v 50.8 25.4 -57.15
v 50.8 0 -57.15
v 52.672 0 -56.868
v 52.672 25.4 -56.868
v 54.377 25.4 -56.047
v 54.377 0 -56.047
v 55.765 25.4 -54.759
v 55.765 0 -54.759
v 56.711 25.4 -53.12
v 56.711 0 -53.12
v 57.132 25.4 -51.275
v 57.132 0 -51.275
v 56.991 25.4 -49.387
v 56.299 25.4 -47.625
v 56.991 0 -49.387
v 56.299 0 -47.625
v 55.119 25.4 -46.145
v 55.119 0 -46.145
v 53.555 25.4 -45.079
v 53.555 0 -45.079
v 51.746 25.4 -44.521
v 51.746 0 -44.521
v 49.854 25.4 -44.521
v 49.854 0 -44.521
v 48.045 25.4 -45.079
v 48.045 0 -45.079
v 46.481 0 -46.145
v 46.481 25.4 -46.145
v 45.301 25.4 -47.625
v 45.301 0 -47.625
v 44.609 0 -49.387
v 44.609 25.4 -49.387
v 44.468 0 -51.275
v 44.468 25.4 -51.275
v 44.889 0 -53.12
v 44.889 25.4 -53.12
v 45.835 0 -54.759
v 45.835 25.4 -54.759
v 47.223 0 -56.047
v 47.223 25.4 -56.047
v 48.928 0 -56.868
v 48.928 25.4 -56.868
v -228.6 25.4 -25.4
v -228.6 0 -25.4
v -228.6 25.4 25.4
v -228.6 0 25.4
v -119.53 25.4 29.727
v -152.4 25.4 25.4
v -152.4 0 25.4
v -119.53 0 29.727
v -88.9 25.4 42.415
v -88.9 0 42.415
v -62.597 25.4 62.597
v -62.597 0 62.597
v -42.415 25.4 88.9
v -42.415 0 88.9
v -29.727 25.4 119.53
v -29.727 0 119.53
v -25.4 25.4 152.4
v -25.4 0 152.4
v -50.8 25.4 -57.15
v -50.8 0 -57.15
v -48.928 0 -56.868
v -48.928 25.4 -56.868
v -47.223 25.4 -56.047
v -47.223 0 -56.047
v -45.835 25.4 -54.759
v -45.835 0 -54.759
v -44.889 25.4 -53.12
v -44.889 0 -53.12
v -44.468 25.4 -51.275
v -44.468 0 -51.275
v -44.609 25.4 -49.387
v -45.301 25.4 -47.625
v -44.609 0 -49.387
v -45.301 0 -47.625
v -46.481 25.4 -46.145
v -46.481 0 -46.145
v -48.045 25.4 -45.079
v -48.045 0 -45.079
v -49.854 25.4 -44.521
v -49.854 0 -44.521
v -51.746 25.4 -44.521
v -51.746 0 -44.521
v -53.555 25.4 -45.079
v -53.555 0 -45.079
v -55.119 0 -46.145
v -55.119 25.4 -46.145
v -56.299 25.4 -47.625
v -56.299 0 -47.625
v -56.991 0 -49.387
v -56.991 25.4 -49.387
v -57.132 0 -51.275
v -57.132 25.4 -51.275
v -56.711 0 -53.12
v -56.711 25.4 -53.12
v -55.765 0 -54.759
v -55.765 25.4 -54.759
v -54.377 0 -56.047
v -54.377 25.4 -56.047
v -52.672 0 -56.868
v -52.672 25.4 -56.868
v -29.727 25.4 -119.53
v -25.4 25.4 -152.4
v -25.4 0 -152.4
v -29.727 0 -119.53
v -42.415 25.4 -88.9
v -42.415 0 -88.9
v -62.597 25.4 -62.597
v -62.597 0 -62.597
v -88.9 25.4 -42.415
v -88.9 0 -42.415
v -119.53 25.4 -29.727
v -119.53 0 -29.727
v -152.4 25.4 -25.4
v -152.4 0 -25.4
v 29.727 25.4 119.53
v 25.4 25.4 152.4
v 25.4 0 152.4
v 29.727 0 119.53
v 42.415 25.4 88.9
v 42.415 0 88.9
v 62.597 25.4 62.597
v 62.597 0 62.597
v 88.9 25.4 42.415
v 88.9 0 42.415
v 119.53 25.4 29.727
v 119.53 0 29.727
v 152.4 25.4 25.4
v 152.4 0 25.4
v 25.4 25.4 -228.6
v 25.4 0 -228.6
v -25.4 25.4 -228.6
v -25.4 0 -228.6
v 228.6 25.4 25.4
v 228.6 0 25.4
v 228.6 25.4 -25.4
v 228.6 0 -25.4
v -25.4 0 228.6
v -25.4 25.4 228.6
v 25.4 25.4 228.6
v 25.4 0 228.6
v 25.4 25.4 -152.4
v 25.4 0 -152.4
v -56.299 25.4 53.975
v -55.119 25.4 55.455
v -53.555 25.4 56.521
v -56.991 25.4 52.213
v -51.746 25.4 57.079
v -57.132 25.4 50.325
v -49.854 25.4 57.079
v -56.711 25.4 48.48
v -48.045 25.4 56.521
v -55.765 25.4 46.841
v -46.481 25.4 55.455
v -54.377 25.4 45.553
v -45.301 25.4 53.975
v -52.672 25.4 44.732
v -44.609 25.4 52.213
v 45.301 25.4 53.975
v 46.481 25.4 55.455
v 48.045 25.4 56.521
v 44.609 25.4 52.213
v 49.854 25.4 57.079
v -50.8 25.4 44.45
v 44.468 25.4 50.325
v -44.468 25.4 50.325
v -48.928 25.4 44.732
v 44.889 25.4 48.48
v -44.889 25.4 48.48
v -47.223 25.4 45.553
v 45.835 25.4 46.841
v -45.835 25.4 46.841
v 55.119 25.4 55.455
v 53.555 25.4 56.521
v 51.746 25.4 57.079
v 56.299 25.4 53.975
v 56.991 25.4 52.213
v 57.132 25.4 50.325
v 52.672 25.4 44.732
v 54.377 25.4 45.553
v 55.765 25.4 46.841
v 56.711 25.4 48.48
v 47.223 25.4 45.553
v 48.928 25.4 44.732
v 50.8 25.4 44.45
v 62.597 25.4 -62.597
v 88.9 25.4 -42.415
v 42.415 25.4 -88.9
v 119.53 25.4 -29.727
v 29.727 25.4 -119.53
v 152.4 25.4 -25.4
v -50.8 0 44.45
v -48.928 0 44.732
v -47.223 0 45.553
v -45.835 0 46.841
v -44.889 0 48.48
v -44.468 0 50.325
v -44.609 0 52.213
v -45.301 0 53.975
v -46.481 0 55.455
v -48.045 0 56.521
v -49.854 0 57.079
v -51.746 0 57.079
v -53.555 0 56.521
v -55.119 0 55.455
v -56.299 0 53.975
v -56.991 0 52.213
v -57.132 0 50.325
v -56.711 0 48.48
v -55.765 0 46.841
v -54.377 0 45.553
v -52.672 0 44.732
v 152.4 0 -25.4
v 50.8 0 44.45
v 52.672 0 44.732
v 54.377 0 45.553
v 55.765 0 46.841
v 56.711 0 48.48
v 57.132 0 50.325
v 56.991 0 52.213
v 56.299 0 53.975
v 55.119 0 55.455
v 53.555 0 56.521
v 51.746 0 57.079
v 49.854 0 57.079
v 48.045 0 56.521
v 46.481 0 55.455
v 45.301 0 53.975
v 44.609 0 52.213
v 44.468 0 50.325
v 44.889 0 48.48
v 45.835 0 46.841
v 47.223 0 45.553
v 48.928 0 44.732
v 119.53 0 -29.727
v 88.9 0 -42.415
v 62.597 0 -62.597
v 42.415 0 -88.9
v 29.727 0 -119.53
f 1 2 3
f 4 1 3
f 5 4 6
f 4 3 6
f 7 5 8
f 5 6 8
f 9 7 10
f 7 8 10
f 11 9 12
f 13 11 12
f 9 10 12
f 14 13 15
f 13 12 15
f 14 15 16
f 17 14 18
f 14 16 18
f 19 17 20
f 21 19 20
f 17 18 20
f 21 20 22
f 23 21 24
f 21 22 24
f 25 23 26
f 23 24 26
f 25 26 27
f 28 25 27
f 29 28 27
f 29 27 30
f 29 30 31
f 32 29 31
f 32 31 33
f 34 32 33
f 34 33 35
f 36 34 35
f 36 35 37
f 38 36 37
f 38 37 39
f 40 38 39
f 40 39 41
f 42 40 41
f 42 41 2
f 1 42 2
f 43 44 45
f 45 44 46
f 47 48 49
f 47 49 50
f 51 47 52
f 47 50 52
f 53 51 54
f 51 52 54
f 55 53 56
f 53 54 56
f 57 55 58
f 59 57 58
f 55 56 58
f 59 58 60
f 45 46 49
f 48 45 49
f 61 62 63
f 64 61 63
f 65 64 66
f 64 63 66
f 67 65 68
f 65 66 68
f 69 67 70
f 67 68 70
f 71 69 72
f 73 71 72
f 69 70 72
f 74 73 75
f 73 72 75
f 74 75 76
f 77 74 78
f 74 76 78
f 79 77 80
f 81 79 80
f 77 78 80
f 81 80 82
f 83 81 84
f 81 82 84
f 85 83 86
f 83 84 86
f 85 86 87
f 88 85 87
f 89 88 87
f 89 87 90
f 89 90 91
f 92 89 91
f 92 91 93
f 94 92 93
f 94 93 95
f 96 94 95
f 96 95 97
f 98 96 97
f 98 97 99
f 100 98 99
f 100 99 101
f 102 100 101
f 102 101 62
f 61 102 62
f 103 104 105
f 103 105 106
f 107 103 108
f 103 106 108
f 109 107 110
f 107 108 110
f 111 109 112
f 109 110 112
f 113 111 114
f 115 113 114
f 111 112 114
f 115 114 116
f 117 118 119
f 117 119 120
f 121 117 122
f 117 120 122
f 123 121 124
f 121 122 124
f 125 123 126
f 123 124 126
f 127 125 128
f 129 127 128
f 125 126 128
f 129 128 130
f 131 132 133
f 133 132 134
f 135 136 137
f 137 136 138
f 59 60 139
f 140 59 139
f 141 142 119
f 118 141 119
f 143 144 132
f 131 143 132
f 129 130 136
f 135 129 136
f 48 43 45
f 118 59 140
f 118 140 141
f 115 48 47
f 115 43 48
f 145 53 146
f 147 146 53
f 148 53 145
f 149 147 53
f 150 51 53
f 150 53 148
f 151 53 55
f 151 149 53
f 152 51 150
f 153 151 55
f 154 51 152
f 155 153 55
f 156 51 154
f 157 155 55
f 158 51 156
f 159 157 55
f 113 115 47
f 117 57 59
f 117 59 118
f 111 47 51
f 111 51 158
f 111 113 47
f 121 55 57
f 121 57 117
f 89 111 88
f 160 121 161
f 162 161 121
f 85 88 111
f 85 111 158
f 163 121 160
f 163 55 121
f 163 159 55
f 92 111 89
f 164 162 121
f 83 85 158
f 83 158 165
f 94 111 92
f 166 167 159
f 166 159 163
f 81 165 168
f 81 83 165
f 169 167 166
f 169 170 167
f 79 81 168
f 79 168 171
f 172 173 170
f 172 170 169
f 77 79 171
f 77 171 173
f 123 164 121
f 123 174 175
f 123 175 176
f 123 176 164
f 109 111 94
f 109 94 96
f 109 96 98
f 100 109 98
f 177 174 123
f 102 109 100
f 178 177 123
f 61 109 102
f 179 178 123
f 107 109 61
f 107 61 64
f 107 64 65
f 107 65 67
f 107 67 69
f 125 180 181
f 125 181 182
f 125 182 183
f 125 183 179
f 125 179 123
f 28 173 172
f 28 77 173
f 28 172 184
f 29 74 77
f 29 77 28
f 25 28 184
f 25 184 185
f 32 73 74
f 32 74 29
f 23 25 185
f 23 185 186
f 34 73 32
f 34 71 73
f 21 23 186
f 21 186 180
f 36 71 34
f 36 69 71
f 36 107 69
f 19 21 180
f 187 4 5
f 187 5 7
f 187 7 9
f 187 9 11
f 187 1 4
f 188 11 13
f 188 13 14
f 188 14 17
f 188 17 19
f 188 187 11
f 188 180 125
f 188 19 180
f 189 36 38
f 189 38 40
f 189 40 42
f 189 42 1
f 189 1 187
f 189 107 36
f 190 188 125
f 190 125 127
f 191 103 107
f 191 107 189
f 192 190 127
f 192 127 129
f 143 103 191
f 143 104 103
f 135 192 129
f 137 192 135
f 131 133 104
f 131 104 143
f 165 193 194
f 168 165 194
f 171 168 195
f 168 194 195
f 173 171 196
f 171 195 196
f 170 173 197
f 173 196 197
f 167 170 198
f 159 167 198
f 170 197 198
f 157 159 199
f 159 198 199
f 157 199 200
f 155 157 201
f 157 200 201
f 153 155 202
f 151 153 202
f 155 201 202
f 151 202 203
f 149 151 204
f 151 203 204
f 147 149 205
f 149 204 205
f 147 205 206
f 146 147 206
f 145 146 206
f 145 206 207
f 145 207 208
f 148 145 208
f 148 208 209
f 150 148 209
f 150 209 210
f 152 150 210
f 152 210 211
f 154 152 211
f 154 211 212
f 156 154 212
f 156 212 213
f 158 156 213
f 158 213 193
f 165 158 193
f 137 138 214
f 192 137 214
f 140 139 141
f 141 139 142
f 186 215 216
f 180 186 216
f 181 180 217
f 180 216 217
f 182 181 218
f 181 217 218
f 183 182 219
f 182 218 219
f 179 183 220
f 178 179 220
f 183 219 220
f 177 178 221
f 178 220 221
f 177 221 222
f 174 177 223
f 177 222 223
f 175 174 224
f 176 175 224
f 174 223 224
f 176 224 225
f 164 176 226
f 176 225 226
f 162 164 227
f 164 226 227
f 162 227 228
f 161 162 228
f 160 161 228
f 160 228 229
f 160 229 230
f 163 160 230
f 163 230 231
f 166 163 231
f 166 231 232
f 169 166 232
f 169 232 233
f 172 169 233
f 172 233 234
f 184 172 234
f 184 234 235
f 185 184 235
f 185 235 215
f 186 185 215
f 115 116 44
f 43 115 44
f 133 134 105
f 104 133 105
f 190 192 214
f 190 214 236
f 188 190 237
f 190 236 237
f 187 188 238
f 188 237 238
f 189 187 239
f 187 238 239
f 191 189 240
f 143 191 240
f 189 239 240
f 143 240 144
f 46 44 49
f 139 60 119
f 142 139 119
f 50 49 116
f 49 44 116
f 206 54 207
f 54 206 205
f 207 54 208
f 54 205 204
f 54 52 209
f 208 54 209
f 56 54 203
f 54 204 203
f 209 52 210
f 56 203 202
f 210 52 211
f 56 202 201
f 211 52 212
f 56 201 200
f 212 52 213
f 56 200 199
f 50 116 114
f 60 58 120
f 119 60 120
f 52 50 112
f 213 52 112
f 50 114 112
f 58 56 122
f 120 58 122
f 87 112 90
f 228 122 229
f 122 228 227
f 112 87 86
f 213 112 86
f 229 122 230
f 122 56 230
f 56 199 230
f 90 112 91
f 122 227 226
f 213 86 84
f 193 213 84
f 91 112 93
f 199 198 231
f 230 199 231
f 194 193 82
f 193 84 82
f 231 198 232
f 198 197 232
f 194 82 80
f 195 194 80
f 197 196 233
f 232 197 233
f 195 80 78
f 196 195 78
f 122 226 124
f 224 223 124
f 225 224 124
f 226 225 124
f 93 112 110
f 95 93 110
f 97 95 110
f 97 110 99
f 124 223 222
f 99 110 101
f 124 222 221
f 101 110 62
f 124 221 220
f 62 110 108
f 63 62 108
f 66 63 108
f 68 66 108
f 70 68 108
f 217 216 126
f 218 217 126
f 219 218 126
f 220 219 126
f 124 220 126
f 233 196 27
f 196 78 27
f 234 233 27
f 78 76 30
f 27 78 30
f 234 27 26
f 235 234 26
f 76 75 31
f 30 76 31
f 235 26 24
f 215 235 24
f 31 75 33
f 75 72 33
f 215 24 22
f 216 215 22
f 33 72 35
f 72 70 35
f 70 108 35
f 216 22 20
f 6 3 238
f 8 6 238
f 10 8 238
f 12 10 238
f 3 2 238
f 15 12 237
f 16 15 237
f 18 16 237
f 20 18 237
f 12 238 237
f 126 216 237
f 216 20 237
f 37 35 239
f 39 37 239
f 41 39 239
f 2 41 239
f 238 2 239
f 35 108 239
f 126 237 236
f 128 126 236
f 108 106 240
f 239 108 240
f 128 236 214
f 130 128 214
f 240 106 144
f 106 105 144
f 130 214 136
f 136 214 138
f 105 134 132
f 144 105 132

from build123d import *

# Parameters (mm, degrees)
BOSS_EXTRUDE1_DEPTH = 25.4
CUT_EXTRUDE1_REACH  = 326.285
SKETCH2_R           = 6.35


with BuildPart() as part:
    # Sketch1 → Boss-Extrude1 (new body)
    with BuildSketch(Plane(origin=(0, 0, 0), x_dir=(1, 0, 0), z_dir=(0, 1, 0))):
        with BuildLine():
            Line((-152.4, 25.4), (-228.6, 25.4))
            Line((-228.6, 25.4), (-228.6, -25.4))
            Line((-228.6, -25.4), (-152.4, -25.4))
            ThreePointArc((-152.4, -25.4), (-62.597438789, -62.597438789), (-25.4, -152.4))
            Line((-25.4, -152.4), (-25.4, -228.6))
            Line((-25.4, -228.6), (25.4, -228.6))
            Line((25.4, -228.6), (25.4, -152.4))
            ThreePointArc((25.4, -152.4), (62.597438789, -62.597438789), (152.4, -25.4))
            Line((152.4, -25.4), (228.6, -25.4))
            Line((228.6, -25.4), (228.6, 25.4))
            Line((228.6, 25.4), (152.4, 25.4))
            ThreePointArc((152.4, 25.4), (62.597438789, 62.597438789), (25.4, 152.4))
            Line((25.4, 152.4), (25.4, 228.6))
            Line((25.4, 228.6), (-25.4, 228.6))
            Line((-25.4, 228.6), (-25.4, 152.4))
            ThreePointArc((-25.4, 152.4), (-62.597438789, 62.597438789), (-152.4, 25.4))
        make_face()
    extrude(amount=BOSS_EXTRUDE1_DEPTH)

    # Sketch2 → Cut-Extrude1 (cut, up to next)
    with BuildSketch(Plane(origin=(0, 0, 0), x_dir=(-1, 0, 0), z_dir=(0, -1, 0)), mode=Mode.PRIVATE) as cut_extrude1_sk1:
        with Locations(Location((50.8, -50.8, 0), (0, 0, 90))):
            Circle(SKETCH2_R)
    cut_extrude1_tool1 = extrude(cut_extrude1_sk1.sketch, amount=-CUT_EXTRUDE1_REACH, mode=Mode.PRIVATE) & part.part
    # Sketch2 → Cut-Extrude1 (cut, up to next)
    with BuildSketch(Plane(origin=(0, 0, 0), x_dir=(-1, 0, 0), z_dir=(0, -1, 0)), mode=Mode.PRIVATE) as cut_extrude1_sk2:
        with Locations(Location((50.8, 50.8, 0), (0, 0, 90))):
            Circle(SKETCH2_R)
    cut_extrude1_tool2 = extrude(cut_extrude1_sk2.sketch, amount=-CUT_EXTRUDE1_REACH, mode=Mode.PRIVATE) & part.part
    # Sketch2 → Cut-Extrude1 (cut, up to next)
    with BuildSketch(Plane(origin=(0, 0, 0), x_dir=(-1, 0, 0), z_dir=(0, -1, 0)), mode=Mode.PRIVATE) as cut_extrude1_sk3:
        with Locations(Location((-50.8, 50.8, 0), (0, 0, 90))):
            Circle(SKETCH2_R)
    cut_extrude1_tool3 = extrude(cut_extrude1_sk3.sketch, amount=-CUT_EXTRUDE1_REACH, mode=Mode.PRIVATE) & part.part
    # Sketch2 → Cut-Extrude1 (cut, up to next)
    with BuildSketch(Plane(origin=(0, 0, 0), x_dir=(-1, 0, 0), z_dir=(0, -1, 0)), mode=Mode.PRIVATE) as cut_extrude1_sk4:
        with Locations(Location((-50.8, -50.8, 0), (0, 0, 90))):
            Circle(SKETCH2_R)
    cut_extrude1_tool4 = extrude(cut_extrude1_sk4.sketch, amount=-CUT_EXTRUDE1_REACH, mode=Mode.PRIVATE) & part.part
    add(cut_extrude1_tool1.solids().sort_by_distance((-50.8, 0, 50.8))[0], mode=Mode.SUBTRACT)
    add(cut_extrude1_tool2.solids().sort_by_distance((-50.8, 0, -50.8))[0], mode=Mode.SUBTRACT)
    add(cut_extrude1_tool3.solids().sort_by_distance((50.8, 0, -50.8))[0], mode=Mode.SUBTRACT)
    add(cut_extrude1_tool4.solids().sort_by_distance((50.8, 0, 50.8))[0], mode=Mode.SUBTRACT)


solid = part.part
